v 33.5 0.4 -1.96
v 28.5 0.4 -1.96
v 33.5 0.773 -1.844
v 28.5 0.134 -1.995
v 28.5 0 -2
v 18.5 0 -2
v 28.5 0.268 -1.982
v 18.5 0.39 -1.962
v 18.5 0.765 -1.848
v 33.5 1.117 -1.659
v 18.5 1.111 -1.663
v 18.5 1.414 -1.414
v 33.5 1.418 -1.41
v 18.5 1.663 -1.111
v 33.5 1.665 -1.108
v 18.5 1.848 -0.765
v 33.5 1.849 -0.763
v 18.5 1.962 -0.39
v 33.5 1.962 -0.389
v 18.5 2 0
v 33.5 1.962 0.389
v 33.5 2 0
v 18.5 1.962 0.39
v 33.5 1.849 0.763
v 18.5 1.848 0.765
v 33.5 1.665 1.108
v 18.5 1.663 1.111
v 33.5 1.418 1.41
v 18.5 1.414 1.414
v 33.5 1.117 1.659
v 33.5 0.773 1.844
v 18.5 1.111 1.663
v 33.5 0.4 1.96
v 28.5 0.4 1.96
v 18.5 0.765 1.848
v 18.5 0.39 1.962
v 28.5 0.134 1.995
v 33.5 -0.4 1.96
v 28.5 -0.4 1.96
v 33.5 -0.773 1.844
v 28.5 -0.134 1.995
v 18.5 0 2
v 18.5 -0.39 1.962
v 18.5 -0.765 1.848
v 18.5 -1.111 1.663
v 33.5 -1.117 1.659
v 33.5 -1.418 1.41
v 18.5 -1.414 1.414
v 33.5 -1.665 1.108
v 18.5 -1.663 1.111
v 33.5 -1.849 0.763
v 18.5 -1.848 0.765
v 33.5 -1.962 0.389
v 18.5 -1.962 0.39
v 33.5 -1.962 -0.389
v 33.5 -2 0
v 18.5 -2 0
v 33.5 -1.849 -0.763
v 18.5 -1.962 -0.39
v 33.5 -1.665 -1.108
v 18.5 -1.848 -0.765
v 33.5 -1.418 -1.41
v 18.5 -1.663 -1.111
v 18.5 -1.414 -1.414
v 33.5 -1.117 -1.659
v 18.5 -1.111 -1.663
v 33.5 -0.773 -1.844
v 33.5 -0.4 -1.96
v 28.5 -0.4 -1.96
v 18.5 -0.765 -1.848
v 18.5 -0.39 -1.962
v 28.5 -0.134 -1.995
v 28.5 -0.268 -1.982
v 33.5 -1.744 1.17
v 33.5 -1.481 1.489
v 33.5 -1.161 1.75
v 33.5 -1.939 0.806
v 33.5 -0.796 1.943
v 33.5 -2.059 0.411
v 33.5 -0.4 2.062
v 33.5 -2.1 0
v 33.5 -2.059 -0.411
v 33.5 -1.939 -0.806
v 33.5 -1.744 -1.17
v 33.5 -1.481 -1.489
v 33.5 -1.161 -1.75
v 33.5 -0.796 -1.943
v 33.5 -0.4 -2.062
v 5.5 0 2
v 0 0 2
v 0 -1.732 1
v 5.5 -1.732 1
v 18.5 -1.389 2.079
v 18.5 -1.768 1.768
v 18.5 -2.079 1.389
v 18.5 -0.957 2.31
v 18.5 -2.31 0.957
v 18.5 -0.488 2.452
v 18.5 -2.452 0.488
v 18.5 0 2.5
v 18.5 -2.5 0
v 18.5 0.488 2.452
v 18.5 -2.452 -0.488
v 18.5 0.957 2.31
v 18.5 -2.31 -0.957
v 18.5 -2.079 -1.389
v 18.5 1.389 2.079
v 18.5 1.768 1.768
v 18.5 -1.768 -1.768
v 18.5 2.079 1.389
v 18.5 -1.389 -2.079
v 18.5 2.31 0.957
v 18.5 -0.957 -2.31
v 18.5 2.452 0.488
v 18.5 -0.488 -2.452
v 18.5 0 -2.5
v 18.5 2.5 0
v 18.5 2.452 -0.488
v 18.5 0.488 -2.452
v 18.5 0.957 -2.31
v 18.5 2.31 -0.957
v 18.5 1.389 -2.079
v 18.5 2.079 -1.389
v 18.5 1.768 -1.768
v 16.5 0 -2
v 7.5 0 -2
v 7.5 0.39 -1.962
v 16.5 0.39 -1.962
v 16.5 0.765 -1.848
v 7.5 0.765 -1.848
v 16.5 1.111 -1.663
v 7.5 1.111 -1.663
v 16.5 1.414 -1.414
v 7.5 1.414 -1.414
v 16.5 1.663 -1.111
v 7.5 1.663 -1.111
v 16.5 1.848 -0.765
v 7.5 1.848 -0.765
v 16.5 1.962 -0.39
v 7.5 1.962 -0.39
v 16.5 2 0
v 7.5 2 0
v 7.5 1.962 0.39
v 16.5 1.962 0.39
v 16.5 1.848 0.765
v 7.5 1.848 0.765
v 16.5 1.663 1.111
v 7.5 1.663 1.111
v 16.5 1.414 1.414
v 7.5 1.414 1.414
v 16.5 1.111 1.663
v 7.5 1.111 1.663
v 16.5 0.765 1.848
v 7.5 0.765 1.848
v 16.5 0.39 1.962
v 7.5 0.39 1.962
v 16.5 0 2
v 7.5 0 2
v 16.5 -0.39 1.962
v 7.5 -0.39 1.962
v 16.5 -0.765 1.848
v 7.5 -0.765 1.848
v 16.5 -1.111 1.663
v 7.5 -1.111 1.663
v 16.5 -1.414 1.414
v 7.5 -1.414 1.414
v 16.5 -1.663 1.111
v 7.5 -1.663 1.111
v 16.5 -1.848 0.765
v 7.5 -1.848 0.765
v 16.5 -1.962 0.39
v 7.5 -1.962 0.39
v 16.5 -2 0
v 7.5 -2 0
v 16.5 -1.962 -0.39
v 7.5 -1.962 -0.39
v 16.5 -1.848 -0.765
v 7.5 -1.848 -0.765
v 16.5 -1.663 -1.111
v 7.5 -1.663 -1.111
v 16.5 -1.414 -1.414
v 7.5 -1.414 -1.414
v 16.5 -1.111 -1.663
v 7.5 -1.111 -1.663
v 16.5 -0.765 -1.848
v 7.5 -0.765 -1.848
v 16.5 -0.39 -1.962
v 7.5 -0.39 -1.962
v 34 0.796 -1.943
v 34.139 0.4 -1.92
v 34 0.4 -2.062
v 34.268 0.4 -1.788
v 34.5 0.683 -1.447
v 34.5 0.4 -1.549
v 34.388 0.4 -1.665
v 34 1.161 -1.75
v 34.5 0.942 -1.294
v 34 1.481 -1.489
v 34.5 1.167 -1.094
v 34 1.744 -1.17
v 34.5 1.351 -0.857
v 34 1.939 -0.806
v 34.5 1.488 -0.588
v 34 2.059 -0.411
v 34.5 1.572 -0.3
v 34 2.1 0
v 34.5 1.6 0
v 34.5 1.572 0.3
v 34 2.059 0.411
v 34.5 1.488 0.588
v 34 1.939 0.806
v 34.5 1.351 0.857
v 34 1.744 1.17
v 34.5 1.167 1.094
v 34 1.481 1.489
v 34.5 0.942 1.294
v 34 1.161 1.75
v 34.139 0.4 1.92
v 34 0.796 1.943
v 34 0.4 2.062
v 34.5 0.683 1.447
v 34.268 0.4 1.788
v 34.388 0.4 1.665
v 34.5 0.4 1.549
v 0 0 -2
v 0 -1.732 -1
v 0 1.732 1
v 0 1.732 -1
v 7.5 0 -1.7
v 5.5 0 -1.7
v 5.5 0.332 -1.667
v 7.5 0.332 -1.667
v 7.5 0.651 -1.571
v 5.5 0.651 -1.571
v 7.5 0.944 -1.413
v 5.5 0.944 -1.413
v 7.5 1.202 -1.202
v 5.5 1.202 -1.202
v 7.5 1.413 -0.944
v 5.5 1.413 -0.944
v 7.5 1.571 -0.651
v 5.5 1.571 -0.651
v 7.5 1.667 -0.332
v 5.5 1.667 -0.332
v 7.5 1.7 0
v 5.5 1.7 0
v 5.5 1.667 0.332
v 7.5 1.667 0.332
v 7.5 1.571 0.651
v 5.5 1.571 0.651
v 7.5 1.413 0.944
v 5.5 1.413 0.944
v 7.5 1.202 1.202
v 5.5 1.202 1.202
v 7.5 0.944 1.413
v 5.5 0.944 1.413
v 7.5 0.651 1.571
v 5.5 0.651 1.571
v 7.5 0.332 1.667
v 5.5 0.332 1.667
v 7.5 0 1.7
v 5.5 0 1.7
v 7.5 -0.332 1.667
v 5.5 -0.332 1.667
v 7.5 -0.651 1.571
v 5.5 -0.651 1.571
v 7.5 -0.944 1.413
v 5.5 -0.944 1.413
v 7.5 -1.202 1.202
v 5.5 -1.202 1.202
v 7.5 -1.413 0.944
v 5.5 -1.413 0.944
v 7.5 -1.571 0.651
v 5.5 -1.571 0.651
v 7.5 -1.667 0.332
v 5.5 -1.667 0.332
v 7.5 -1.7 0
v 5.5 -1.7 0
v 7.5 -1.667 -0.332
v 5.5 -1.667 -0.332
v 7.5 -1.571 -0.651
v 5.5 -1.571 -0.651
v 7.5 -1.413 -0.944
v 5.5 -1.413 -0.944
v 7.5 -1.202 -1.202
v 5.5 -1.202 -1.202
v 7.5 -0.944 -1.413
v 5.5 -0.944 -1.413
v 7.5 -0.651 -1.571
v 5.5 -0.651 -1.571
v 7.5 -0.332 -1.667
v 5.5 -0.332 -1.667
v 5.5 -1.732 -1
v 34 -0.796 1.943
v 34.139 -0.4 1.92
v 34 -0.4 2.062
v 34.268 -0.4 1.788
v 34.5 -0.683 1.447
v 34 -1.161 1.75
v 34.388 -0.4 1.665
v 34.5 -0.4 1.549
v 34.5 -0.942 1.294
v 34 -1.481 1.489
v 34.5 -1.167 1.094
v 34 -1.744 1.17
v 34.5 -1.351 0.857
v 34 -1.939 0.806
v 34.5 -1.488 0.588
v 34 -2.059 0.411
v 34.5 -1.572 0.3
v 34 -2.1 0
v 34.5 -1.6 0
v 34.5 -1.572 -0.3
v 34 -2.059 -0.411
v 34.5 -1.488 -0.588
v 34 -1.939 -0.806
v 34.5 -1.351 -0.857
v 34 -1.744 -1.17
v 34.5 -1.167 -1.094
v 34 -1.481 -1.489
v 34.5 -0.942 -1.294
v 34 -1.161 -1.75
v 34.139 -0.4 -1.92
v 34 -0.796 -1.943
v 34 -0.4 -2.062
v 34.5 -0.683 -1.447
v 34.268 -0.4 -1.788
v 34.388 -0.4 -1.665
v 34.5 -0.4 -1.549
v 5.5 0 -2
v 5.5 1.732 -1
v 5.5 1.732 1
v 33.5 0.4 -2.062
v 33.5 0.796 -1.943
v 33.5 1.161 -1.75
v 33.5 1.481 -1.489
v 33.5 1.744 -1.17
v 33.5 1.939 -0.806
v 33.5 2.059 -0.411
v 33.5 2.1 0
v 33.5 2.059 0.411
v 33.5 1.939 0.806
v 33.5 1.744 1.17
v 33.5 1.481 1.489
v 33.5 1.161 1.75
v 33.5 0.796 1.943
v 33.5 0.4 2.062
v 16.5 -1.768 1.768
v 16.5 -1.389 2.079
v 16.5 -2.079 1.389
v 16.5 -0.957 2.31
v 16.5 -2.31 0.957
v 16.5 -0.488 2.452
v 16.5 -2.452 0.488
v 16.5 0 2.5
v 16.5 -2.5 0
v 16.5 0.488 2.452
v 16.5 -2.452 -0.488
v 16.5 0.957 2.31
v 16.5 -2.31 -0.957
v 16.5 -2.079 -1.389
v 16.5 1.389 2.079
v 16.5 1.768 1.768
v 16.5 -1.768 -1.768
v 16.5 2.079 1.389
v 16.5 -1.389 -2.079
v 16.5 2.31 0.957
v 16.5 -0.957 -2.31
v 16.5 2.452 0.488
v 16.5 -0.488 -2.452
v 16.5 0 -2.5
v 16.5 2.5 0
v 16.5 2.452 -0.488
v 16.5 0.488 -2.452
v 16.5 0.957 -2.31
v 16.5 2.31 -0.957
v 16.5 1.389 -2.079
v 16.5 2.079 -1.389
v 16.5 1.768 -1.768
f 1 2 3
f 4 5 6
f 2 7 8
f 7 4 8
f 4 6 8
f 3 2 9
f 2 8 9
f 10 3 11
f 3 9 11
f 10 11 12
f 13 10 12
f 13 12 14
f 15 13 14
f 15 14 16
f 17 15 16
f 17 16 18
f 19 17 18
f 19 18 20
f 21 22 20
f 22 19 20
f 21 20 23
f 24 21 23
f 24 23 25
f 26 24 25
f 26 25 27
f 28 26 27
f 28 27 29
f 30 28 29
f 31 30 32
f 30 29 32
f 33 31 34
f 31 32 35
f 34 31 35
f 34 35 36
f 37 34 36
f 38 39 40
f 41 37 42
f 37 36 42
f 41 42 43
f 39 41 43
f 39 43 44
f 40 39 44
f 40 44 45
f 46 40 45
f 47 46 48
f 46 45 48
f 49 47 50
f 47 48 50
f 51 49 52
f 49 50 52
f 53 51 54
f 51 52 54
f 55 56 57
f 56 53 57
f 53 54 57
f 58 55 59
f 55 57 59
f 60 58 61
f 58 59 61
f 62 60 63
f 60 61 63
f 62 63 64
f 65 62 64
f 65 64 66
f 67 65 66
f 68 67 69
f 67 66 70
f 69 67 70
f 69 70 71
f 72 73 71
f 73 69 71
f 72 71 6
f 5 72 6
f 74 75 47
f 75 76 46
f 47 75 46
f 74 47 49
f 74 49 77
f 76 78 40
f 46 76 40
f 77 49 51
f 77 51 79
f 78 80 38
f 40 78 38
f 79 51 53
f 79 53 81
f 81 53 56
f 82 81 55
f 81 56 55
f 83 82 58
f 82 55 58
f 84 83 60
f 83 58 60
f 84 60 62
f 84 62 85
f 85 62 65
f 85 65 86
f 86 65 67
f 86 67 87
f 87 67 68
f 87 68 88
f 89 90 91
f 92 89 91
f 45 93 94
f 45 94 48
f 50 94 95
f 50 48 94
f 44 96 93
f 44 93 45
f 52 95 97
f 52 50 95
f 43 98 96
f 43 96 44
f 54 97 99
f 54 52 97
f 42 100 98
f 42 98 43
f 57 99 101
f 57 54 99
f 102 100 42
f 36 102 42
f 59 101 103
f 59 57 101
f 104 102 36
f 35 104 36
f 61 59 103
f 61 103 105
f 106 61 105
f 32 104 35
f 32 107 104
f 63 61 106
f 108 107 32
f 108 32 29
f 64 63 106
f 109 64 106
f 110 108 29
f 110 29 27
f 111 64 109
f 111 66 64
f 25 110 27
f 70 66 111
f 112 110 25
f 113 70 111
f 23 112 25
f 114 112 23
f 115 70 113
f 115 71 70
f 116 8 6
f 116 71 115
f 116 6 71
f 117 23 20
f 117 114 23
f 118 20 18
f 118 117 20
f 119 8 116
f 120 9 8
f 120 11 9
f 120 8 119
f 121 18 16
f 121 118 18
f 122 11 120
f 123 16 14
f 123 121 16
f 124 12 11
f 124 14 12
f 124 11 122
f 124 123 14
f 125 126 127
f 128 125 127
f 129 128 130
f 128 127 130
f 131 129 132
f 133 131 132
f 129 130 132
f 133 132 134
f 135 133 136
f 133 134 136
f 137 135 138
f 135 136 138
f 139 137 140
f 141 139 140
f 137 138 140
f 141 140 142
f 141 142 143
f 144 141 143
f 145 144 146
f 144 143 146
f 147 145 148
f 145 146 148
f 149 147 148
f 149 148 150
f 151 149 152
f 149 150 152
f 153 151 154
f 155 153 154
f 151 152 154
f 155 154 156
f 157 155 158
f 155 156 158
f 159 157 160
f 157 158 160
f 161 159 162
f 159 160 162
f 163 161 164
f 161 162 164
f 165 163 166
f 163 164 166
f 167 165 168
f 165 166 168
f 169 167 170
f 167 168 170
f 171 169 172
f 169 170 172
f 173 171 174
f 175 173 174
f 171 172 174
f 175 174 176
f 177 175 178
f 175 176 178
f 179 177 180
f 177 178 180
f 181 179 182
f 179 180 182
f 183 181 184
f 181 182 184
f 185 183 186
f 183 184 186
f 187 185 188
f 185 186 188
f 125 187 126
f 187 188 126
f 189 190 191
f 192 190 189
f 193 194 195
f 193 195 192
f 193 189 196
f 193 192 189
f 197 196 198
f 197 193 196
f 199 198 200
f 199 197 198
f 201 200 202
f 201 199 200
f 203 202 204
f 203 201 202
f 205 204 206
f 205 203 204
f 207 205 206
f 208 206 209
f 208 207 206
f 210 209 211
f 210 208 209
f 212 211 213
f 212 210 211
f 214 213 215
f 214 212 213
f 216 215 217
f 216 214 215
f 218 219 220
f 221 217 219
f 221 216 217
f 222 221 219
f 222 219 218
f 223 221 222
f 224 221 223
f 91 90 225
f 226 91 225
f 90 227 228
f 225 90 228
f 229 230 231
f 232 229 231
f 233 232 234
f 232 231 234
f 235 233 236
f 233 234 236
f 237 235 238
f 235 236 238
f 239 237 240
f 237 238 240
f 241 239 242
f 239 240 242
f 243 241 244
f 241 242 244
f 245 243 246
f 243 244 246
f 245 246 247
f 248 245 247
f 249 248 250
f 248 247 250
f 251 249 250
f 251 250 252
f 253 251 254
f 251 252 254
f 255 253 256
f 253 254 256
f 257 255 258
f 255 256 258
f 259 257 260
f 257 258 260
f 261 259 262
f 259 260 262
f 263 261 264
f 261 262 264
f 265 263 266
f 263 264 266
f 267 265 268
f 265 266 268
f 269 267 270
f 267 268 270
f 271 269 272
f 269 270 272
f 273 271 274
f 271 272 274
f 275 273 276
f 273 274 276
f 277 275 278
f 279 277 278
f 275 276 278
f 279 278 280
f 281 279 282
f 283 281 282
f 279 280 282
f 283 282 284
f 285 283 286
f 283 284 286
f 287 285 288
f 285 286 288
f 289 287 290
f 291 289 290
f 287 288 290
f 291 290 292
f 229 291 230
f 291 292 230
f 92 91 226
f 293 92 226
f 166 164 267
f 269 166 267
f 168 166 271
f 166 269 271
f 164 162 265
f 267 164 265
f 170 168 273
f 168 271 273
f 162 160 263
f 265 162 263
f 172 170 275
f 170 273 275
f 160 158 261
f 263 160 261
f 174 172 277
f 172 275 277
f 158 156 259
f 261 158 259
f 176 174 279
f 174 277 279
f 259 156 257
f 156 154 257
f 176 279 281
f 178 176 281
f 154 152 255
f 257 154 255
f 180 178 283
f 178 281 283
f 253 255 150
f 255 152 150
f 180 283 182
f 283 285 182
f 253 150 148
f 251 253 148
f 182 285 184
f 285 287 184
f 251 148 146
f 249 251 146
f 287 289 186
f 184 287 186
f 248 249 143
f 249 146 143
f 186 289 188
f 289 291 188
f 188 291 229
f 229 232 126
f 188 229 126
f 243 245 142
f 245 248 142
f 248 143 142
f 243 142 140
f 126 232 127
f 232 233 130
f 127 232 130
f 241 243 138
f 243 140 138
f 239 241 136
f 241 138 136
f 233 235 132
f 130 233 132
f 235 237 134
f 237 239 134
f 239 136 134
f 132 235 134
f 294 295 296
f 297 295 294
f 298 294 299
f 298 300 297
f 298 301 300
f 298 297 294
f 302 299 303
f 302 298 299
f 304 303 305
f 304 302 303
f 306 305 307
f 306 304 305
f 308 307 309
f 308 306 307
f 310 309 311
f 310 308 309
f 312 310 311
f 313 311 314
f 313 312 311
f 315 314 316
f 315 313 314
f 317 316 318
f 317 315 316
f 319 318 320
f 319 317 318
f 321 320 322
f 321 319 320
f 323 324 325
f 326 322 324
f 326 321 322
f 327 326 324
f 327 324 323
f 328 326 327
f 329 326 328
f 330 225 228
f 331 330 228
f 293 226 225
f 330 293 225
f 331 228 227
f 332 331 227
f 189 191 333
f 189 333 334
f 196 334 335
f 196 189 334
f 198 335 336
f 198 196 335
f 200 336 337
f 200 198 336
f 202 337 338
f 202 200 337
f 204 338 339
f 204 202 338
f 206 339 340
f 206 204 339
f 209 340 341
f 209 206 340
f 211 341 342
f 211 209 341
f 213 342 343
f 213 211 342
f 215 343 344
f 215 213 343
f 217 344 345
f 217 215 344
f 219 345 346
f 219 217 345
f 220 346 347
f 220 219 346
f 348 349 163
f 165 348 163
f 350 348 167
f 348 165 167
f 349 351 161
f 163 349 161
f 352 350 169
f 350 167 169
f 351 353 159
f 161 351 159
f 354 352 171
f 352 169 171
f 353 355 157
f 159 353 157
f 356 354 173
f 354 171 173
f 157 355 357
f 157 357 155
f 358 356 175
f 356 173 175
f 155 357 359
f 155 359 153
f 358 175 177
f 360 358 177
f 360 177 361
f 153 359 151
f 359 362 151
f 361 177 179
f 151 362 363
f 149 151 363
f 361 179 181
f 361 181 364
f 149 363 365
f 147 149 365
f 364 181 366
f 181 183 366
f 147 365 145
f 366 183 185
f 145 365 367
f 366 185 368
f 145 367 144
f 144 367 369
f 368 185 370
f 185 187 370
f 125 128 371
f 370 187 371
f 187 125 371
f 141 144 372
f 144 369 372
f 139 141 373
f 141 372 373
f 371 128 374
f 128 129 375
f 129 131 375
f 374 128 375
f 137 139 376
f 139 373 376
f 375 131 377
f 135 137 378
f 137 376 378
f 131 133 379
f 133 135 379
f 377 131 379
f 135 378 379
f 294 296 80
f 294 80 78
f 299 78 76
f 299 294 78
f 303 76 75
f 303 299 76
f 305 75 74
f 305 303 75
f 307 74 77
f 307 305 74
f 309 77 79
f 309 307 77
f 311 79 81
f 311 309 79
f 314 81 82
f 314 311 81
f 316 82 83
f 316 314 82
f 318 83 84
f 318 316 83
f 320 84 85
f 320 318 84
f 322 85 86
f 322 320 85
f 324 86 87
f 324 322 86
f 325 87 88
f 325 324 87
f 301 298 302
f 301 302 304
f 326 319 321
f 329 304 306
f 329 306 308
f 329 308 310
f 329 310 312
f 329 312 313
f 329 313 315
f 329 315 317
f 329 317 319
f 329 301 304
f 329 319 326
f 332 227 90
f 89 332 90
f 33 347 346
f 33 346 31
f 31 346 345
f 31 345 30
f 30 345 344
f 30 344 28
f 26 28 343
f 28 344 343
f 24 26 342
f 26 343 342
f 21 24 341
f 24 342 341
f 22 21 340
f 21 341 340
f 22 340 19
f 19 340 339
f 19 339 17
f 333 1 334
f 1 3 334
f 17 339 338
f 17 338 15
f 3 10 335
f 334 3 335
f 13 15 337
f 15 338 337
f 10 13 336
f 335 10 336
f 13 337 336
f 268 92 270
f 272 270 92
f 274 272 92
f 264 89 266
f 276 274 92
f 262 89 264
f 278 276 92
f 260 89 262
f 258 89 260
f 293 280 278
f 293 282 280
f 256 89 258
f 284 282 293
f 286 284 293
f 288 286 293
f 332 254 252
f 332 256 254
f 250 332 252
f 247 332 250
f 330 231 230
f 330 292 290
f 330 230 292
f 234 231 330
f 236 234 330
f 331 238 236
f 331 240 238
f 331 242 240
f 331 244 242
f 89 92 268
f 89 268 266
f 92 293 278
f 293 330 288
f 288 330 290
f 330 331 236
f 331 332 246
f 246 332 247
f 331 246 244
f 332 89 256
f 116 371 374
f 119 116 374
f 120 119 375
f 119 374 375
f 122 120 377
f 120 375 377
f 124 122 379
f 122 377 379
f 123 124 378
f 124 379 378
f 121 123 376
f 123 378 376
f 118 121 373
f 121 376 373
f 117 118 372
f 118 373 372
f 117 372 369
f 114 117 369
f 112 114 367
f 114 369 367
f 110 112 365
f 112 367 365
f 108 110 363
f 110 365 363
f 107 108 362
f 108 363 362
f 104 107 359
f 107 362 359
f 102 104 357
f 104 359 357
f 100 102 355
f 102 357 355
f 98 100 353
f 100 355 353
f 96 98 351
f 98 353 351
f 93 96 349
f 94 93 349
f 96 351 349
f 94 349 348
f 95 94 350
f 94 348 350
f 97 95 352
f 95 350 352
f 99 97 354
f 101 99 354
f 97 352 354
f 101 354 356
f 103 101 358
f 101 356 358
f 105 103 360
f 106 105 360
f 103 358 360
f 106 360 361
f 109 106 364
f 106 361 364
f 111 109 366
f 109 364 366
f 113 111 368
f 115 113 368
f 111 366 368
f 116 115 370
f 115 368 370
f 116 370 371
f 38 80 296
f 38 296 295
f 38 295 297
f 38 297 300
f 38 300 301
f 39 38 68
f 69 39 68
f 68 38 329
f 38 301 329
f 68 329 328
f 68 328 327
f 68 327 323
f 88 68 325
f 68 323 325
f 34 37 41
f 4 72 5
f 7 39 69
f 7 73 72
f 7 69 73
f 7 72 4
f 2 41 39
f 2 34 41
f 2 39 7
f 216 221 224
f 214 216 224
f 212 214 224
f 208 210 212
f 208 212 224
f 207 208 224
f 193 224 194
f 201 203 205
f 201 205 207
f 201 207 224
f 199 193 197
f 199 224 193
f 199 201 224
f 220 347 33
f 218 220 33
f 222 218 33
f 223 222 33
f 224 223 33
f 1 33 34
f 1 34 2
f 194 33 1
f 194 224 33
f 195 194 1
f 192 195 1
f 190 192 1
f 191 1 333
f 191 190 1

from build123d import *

# Parameters (mm, degrees)
EXTRUDE_1_DEPTH     = 5.5
SKETCH_2_R          = 1.7
EXTRUDE_2_DEPTH     = 2
SKETCH_3_R          = 2
EXTRUDE_3_DEPTH     = 9
SKETCH_4_R          = 2.5
EXTRUDE_4_DEPTH     = 2
SKETCH_5_R          = 2
EXTRUDE_5_DEPTH     = 16
SKETCH_6_R          = 2.1
EXTRUDE_6_DEPTH     = 1
CHAMFER_1_SIZE      = 0.5
SKETCH_7_W          = 5
SKETCH_7_H          = 0.8
CUT_EXTRUDE_1_DEPTH = 6


with BuildPart() as part:
    # 草图1 → 凸台-拉伸1 (new body)
    with BuildSketch(Plane(origin=(0, 0, 0), x_dir=(0, 0, -1), z_dir=(1, 0, 0))):
        Polygon((-2, 0), (-1, -1.732050808), (1, -1.732050808), (2, 0), (1, 1.732050808), (-1, 1.732050808), align=None)
    extrude(amount=EXTRUDE_1_DEPTH)

    # 草图2 → 凸台-拉伸2 (add)
    with BuildSketch(Plane(origin=(5.5, 0, 0), x_dir=(0, 0, -1), z_dir=(1, 0, 0))):
        Circle(SKETCH_2_R)
    extrude(amount=EXTRUDE_2_DEPTH)

    # 草图3 → 凸台-拉伸3 (add)
    with BuildSketch(Plane(origin=(7.5, 0, 0), x_dir=(0, 0, -1), z_dir=(1, 0, 0))):
        Circle(SKETCH_3_R)
    extrude(amount=EXTRUDE_3_DEPTH)

    # 草图4 → 凸台-拉伸4 (add)
    with BuildSketch(Plane(origin=(16.5, 0, 0), x_dir=(0, 0, -1), z_dir=(1, 0, 0))):
        Circle(SKETCH_4_R)
    extrude(amount=EXTRUDE_4_DEPTH)

    # 草图5 → 凸台-拉伸5 (add)
    with BuildSketch(Plane(origin=(18.5, 0, 0), x_dir=(0, 0, -1), z_dir=(1, 0, 0))):
        Circle(SKETCH_5_R)
    extrude(amount=EXTRUDE_5_DEPTH)

    # 草图6 → 凸台-拉伸6 (add)
    with BuildSketch(Plane(origin=(34.5, 0, 0), x_dir=(0, 0, -1), z_dir=(1, 0, 0))):
        Circle(SKETCH_6_R)
    extrude(amount=-EXTRUDE_6_DEPTH)

    # 倒角1
    chamfer_1_edges = [part.edges().sort_by_distance(p)[0] for p in [
        (34.5, 0, 2.1),
    ]]
    chamfer(chamfer_1_edges, length=CHAMFER_1_SIZE)

    # 草图7 → 切除-拉伸1 (cut)
    with BuildSketch(Plane(origin=(34.5, 0, 0), x_dir=(0, 0, -1), z_dir=(1, 0, 0))):
        Rectangle(SKETCH_7_W, SKETCH_7_H)
    extrude(amount=-CUT_EXTRUDE_1_DEPTH, mode=Mode.SUBTRACT)


solid = part.part
